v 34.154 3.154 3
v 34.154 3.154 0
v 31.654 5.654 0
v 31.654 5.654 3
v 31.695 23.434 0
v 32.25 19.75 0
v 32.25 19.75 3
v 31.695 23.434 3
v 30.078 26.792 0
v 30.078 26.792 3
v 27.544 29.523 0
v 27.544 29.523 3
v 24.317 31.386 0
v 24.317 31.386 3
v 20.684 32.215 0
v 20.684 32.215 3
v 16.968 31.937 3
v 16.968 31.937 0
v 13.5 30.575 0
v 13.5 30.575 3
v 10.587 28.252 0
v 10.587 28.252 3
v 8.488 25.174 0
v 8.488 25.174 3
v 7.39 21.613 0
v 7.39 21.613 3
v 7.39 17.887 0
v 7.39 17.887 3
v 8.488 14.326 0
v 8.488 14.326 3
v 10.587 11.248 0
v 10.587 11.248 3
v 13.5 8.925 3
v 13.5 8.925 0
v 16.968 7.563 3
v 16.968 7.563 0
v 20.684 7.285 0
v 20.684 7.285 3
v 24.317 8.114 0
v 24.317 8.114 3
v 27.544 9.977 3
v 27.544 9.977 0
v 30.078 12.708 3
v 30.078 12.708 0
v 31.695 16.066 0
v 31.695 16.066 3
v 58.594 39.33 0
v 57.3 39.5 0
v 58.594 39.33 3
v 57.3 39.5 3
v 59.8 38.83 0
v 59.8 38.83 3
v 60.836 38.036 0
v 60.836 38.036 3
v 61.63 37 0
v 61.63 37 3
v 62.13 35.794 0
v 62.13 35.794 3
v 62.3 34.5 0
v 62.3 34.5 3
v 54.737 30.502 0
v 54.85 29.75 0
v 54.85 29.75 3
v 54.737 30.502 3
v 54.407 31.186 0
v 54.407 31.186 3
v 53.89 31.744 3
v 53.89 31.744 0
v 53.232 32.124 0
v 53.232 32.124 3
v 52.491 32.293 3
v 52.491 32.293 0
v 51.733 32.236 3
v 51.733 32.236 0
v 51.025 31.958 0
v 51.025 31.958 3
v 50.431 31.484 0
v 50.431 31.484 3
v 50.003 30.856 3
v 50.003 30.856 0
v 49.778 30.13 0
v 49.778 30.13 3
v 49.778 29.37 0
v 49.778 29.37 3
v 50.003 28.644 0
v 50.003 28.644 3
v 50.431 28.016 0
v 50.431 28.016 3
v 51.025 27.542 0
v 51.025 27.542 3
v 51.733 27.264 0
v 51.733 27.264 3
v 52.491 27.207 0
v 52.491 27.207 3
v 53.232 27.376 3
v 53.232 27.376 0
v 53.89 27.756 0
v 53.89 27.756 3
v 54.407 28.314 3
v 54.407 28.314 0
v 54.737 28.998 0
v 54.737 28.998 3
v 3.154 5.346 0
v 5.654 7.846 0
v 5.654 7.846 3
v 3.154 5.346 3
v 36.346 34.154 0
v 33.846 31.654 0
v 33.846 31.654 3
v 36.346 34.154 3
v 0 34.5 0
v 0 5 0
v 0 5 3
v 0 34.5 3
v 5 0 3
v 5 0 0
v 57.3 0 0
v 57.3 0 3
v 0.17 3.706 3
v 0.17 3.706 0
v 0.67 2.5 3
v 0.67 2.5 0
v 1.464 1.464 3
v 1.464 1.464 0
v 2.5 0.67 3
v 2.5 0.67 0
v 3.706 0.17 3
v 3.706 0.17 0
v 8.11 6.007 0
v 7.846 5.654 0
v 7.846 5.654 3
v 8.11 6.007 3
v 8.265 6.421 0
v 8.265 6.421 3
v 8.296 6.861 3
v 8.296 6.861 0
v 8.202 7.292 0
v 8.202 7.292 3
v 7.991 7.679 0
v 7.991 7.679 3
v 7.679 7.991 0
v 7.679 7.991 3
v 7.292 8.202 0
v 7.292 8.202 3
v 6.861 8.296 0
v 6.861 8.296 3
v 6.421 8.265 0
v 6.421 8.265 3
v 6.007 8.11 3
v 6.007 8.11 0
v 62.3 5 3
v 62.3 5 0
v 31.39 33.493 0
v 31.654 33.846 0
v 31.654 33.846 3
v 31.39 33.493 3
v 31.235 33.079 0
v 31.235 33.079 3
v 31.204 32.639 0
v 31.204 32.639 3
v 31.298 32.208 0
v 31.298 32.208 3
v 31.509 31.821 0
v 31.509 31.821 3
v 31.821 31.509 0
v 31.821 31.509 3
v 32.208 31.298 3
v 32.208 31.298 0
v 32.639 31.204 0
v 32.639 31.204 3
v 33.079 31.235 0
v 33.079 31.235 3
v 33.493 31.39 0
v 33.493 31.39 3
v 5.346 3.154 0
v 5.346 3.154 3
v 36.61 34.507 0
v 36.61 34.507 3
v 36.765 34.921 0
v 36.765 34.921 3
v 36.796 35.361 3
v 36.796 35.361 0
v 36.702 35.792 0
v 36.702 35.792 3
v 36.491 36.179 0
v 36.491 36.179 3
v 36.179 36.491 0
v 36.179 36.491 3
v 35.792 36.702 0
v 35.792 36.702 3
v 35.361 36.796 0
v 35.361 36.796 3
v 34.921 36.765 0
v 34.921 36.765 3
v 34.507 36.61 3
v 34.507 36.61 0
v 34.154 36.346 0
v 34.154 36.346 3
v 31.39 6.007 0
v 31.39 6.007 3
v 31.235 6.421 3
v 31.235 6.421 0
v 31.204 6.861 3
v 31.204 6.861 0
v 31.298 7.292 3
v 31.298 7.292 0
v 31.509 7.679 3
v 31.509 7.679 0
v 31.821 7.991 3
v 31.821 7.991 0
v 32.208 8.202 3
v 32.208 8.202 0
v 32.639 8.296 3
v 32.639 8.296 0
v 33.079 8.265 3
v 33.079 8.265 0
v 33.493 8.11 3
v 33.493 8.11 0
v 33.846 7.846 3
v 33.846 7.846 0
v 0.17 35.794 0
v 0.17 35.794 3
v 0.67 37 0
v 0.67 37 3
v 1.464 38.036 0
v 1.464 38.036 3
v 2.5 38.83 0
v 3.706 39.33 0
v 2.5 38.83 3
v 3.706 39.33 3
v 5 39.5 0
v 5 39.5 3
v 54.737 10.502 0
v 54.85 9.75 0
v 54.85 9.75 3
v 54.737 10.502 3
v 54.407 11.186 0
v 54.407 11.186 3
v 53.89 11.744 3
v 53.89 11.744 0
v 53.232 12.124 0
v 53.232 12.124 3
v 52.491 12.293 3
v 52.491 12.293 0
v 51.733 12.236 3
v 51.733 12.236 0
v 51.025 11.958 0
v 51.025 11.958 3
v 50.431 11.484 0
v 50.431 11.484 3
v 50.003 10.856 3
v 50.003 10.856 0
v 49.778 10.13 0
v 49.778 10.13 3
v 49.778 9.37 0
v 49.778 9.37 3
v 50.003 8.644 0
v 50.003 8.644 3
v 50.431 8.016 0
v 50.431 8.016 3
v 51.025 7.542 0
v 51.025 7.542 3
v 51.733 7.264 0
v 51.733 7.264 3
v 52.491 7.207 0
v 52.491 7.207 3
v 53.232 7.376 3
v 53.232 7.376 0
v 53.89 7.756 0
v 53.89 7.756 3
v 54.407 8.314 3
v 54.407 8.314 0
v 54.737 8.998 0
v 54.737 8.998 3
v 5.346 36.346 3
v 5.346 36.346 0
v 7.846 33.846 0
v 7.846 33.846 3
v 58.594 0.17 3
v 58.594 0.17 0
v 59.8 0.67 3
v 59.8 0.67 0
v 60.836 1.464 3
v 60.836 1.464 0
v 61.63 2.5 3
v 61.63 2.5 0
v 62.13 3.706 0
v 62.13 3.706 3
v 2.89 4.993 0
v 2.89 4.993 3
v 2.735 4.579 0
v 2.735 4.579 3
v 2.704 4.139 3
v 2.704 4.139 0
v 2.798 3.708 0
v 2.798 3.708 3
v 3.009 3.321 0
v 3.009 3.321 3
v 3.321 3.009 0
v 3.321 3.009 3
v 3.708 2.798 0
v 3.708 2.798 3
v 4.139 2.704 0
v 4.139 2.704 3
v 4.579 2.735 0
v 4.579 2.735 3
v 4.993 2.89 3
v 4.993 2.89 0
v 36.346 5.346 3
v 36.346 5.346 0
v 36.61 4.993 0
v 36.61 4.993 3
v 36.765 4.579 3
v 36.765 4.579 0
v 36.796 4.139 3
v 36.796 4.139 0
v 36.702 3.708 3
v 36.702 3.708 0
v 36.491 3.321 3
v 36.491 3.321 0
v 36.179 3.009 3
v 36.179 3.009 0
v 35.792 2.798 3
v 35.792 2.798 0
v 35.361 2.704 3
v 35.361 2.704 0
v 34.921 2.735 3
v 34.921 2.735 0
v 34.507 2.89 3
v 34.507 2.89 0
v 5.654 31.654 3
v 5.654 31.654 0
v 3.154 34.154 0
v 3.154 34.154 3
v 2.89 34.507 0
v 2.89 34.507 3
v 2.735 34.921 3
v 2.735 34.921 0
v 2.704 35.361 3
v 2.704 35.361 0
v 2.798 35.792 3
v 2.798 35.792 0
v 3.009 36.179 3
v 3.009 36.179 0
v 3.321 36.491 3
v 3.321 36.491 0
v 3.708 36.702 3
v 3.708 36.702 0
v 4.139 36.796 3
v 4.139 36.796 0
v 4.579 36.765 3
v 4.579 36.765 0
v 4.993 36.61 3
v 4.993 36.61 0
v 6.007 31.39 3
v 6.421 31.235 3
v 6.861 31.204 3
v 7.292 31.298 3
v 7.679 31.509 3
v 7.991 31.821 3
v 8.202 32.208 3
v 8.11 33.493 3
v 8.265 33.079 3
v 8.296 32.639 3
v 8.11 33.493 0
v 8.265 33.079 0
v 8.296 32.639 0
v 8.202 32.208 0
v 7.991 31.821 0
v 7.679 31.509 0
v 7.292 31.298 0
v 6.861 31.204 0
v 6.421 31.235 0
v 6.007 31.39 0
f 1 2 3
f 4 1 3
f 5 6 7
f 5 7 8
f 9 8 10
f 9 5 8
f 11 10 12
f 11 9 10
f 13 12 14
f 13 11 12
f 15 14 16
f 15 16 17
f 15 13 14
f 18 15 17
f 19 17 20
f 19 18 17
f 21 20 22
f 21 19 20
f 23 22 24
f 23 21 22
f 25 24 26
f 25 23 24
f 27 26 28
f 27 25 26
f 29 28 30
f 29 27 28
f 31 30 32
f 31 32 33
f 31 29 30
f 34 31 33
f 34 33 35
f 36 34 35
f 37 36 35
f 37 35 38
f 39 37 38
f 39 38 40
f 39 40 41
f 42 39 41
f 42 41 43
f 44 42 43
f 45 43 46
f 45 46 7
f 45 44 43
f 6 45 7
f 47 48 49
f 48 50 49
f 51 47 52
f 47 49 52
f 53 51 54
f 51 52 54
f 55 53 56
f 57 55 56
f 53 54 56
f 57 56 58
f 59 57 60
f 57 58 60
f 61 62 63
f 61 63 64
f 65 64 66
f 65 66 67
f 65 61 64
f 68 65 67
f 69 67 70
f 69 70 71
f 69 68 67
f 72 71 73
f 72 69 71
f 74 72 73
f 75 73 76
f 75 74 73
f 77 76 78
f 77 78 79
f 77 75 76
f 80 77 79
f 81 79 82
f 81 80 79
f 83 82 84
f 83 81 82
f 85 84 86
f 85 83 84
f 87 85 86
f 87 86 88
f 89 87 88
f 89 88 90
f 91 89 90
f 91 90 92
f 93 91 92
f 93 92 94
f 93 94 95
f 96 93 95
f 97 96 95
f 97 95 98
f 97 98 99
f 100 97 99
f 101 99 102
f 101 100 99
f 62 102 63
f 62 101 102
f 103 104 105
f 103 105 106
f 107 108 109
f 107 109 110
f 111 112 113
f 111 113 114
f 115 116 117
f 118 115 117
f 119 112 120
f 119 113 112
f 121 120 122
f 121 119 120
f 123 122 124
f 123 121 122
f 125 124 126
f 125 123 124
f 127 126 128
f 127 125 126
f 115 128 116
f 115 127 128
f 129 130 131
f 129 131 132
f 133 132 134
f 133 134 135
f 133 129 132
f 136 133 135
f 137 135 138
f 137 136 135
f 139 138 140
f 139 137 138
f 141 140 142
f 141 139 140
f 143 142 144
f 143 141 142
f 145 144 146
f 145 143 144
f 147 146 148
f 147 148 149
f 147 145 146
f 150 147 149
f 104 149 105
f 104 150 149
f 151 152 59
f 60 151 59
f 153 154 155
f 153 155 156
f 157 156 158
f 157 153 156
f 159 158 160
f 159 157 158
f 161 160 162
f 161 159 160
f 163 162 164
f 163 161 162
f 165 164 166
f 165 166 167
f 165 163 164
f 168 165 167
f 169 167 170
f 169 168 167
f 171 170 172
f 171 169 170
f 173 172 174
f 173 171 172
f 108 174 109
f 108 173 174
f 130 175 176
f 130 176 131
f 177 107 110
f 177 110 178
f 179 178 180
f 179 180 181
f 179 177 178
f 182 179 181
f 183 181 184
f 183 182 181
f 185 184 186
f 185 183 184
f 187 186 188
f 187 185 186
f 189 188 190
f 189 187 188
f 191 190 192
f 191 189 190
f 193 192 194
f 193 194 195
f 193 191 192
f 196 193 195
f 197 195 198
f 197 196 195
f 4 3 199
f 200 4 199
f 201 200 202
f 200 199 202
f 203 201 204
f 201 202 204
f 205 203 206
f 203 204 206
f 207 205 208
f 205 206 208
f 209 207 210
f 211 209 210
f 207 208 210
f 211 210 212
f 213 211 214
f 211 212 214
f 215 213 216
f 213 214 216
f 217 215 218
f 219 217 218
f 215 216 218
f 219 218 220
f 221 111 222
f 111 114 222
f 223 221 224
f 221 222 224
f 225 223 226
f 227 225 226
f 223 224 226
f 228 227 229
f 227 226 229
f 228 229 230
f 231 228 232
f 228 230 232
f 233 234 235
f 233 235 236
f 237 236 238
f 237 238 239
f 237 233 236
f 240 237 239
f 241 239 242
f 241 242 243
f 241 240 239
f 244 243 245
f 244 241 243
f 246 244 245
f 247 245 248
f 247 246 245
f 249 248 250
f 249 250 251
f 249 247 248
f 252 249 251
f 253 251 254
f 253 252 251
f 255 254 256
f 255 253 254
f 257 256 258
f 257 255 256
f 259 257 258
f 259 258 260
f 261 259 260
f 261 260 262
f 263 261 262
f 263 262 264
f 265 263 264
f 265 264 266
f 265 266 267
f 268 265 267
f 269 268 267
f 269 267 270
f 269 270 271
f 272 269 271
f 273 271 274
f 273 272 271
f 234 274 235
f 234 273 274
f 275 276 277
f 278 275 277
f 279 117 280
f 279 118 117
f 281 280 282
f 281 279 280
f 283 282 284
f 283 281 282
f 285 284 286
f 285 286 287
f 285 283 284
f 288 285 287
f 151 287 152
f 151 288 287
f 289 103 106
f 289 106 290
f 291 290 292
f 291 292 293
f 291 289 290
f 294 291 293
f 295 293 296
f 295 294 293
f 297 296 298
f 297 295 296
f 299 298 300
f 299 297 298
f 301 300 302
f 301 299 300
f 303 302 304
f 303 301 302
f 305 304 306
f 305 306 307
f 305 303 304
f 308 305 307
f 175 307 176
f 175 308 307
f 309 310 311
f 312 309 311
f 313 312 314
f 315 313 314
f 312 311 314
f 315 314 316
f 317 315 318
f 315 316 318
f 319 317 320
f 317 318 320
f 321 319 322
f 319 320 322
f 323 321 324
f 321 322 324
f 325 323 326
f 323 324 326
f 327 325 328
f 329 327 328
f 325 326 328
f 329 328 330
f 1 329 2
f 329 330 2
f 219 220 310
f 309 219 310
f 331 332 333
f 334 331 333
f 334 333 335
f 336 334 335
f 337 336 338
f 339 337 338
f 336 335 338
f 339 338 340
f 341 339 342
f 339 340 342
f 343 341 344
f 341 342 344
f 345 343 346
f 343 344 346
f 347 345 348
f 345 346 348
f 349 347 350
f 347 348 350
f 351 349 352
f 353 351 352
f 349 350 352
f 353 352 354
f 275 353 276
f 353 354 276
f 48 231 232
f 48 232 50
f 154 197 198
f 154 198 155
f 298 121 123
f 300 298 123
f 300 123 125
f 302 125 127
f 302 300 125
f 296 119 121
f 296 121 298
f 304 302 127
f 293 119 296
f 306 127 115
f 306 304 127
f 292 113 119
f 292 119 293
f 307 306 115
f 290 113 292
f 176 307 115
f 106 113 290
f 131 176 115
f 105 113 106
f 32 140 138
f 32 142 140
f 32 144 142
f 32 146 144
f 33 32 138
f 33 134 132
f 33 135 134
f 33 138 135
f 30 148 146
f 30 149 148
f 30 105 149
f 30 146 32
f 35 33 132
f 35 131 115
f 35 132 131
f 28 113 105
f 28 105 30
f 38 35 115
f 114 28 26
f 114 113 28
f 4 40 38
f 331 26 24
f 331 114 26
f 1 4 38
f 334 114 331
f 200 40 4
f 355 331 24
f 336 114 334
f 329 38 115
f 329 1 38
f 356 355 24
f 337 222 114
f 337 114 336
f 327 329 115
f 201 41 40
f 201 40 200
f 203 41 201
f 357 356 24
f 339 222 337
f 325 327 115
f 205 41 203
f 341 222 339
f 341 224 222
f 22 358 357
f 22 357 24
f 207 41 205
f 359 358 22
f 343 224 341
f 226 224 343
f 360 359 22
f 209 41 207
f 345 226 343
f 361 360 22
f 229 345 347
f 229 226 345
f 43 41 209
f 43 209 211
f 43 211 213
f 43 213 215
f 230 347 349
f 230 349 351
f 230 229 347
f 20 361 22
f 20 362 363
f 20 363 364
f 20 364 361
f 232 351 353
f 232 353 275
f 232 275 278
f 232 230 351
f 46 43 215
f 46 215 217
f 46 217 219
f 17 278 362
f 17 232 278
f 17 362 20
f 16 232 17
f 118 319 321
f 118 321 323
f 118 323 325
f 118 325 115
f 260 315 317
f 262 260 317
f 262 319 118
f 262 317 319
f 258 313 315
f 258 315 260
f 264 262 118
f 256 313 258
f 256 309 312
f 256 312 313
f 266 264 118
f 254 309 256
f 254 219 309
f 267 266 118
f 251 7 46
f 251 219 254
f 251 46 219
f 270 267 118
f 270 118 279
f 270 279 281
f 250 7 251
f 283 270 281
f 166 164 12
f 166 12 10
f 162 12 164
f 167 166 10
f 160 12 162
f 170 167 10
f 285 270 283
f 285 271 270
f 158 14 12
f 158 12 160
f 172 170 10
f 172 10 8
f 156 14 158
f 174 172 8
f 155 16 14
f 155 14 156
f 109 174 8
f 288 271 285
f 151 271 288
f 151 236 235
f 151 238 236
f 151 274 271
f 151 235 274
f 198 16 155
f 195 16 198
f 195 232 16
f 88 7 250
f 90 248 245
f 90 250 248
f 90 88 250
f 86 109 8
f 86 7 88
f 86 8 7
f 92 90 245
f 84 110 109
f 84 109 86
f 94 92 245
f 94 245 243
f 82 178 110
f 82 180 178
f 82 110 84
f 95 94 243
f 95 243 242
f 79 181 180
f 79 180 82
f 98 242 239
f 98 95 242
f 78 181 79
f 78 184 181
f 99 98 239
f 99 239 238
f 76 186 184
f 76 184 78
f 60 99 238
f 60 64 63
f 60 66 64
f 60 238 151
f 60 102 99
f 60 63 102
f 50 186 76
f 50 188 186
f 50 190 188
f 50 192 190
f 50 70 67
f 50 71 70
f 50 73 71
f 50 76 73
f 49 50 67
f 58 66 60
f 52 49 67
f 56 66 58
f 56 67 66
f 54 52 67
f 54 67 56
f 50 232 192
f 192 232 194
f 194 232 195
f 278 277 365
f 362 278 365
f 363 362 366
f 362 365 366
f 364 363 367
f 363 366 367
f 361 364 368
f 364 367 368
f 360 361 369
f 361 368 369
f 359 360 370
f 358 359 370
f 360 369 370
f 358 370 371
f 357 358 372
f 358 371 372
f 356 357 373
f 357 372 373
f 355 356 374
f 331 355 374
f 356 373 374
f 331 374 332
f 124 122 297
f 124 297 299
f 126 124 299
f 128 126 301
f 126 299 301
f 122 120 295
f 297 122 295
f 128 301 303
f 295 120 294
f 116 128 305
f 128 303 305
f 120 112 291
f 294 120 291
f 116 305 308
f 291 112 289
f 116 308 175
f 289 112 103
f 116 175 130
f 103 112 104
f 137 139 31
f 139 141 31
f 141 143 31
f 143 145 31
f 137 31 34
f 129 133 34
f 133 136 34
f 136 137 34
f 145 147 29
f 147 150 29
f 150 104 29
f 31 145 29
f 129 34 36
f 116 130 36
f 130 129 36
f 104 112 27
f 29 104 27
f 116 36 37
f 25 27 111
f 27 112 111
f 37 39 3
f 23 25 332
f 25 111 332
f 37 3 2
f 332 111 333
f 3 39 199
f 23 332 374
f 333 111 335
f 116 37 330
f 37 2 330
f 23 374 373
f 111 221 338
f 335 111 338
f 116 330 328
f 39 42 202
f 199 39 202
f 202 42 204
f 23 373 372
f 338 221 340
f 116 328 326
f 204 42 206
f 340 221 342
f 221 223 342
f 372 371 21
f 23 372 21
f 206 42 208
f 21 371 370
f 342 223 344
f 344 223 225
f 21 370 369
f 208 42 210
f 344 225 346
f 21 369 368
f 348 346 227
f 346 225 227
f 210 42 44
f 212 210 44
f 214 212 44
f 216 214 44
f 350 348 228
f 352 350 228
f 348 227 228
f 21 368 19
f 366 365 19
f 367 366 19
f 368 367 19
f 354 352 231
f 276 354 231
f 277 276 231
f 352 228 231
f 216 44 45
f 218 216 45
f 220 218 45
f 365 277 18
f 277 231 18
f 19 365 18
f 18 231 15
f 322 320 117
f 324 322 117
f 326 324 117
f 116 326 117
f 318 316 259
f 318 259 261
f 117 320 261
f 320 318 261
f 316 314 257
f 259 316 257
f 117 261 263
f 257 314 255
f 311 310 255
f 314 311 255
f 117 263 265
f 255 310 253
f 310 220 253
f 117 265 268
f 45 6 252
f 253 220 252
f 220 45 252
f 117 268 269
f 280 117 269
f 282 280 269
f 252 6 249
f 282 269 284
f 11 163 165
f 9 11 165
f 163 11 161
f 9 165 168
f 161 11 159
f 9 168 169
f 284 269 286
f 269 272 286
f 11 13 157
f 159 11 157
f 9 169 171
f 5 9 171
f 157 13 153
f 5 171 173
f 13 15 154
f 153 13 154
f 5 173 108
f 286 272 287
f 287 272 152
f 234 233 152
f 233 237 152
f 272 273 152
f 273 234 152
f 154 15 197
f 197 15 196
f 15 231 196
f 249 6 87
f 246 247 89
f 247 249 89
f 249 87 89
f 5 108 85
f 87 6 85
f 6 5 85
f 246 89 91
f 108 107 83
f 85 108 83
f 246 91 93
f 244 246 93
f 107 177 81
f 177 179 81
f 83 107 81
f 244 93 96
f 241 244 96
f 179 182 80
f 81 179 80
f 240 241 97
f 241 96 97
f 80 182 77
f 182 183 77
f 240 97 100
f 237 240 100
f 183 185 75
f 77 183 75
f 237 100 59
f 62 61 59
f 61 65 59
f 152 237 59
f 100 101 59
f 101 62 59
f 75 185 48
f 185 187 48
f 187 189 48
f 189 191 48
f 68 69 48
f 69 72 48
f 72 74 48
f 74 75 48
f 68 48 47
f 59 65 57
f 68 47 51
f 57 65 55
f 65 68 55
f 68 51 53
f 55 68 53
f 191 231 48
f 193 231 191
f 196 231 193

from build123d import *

# Parameters (mm, degrees)
SKETCH1_W           = 62.3
SKETCH1_H           = 39.5
SKETCH1_R           = 12.5
SKETCH1_R_2         = 2.55
BOSS_EXTRUDE1_DEPTH = 3
FILLET1_R           = 5


with BuildPart() as part:
    # Sketch1 → Boss-Extrude1 (new body)
    with BuildSketch(Plane.XY):
        with Locations((31.15, 19.75)):
            Rectangle(SKETCH1_W, SKETCH1_H)
        with Locations((19.75, 19.75)):
            Circle(SKETCH1_R, mode=Mode.SUBTRACT)
        with Locations((52.3, 29.75)):
            Circle(SKETCH1_R_2, mode=Mode.SUBTRACT)
        with Locations((52.3, 9.75)):
            Circle(SKETCH1_R_2, mode=Mode.SUBTRACT)
        with BuildLine():
            Line((5.346015511, 36.346015511), (7.846015511, 33.846015511))
            ThreePointArc((7.846015511, 33.846015511), (7.846015511, 31.653984489), (5.653984489, 31.653984489))
            Line((5.653984489, 31.653984489), (3.153984489, 34.153984489))
            ThreePointArc((3.153984489, 34.153984489), (3.153984489, 36.346015511), (5.346015511, 36.346015511))
        make_face(mode=Mode.SUBTRACT)
        with BuildLine():
            Line((34.153984489, 36.346015511), (31.653984489, 33.846015511))
            ThreePointArc((31.653984489, 33.846015511), (31.653984489, 31.653984489), (33.846015511, 31.653984489))
            Line((33.846015511, 31.653984489), (36.346015511, 34.153984489))
            ThreePointArc((36.346015511, 34.153984489), (36.346015511, 36.346015511), (34.153984489, 36.346015511))
        make_face(mode=Mode.SUBTRACT)
        with BuildLine():
            Line((34.153984489, 3.153984489), (31.653984489, 5.653984489))
            ThreePointArc((31.653984489, 5.653984489), (31.653984489, 7.846015511), (33.846015511, 7.846015511))
            Line((33.846015511, 7.846015511), (36.346015511, 5.346015511))
            ThreePointArc((36.346015511, 5.346015511), (36.346015511, 3.153984489), (34.153984489, 3.153984489))
        make_face(mode=Mode.SUBTRACT)
        with BuildLine():
            Line((5.346015511, 3.153984489), (7.846015511, 5.653984489))
            ThreePointArc((7.846015511, 5.653984489), (7.846015511, 7.846015511), (5.653984489, 7.846015511))
            Line((5.653984489, 7.846015511), (3.153984489, 5.346015511))
            ThreePointArc((3.153984489, 5.346015511), (3.153984489, 3.153984489), (5.346015511, 3.153984489))
        make_face(mode=Mode.SUBTRACT)
    extrude(amount=BOSS_EXTRUDE1_DEPTH)

    # Fillet1
    fillet1_edges = [part.edges().sort_by_distance(p)[0] for p in [
        (0, 39.5, 1.5),
        (62.3, 39.5, 1.5),
        (62.3, 0, 1.5),
        (0, 0, 1.5),
    ]]
    fillet(fillet1_edges, radius=FILLET1_R)


solid = part.part
